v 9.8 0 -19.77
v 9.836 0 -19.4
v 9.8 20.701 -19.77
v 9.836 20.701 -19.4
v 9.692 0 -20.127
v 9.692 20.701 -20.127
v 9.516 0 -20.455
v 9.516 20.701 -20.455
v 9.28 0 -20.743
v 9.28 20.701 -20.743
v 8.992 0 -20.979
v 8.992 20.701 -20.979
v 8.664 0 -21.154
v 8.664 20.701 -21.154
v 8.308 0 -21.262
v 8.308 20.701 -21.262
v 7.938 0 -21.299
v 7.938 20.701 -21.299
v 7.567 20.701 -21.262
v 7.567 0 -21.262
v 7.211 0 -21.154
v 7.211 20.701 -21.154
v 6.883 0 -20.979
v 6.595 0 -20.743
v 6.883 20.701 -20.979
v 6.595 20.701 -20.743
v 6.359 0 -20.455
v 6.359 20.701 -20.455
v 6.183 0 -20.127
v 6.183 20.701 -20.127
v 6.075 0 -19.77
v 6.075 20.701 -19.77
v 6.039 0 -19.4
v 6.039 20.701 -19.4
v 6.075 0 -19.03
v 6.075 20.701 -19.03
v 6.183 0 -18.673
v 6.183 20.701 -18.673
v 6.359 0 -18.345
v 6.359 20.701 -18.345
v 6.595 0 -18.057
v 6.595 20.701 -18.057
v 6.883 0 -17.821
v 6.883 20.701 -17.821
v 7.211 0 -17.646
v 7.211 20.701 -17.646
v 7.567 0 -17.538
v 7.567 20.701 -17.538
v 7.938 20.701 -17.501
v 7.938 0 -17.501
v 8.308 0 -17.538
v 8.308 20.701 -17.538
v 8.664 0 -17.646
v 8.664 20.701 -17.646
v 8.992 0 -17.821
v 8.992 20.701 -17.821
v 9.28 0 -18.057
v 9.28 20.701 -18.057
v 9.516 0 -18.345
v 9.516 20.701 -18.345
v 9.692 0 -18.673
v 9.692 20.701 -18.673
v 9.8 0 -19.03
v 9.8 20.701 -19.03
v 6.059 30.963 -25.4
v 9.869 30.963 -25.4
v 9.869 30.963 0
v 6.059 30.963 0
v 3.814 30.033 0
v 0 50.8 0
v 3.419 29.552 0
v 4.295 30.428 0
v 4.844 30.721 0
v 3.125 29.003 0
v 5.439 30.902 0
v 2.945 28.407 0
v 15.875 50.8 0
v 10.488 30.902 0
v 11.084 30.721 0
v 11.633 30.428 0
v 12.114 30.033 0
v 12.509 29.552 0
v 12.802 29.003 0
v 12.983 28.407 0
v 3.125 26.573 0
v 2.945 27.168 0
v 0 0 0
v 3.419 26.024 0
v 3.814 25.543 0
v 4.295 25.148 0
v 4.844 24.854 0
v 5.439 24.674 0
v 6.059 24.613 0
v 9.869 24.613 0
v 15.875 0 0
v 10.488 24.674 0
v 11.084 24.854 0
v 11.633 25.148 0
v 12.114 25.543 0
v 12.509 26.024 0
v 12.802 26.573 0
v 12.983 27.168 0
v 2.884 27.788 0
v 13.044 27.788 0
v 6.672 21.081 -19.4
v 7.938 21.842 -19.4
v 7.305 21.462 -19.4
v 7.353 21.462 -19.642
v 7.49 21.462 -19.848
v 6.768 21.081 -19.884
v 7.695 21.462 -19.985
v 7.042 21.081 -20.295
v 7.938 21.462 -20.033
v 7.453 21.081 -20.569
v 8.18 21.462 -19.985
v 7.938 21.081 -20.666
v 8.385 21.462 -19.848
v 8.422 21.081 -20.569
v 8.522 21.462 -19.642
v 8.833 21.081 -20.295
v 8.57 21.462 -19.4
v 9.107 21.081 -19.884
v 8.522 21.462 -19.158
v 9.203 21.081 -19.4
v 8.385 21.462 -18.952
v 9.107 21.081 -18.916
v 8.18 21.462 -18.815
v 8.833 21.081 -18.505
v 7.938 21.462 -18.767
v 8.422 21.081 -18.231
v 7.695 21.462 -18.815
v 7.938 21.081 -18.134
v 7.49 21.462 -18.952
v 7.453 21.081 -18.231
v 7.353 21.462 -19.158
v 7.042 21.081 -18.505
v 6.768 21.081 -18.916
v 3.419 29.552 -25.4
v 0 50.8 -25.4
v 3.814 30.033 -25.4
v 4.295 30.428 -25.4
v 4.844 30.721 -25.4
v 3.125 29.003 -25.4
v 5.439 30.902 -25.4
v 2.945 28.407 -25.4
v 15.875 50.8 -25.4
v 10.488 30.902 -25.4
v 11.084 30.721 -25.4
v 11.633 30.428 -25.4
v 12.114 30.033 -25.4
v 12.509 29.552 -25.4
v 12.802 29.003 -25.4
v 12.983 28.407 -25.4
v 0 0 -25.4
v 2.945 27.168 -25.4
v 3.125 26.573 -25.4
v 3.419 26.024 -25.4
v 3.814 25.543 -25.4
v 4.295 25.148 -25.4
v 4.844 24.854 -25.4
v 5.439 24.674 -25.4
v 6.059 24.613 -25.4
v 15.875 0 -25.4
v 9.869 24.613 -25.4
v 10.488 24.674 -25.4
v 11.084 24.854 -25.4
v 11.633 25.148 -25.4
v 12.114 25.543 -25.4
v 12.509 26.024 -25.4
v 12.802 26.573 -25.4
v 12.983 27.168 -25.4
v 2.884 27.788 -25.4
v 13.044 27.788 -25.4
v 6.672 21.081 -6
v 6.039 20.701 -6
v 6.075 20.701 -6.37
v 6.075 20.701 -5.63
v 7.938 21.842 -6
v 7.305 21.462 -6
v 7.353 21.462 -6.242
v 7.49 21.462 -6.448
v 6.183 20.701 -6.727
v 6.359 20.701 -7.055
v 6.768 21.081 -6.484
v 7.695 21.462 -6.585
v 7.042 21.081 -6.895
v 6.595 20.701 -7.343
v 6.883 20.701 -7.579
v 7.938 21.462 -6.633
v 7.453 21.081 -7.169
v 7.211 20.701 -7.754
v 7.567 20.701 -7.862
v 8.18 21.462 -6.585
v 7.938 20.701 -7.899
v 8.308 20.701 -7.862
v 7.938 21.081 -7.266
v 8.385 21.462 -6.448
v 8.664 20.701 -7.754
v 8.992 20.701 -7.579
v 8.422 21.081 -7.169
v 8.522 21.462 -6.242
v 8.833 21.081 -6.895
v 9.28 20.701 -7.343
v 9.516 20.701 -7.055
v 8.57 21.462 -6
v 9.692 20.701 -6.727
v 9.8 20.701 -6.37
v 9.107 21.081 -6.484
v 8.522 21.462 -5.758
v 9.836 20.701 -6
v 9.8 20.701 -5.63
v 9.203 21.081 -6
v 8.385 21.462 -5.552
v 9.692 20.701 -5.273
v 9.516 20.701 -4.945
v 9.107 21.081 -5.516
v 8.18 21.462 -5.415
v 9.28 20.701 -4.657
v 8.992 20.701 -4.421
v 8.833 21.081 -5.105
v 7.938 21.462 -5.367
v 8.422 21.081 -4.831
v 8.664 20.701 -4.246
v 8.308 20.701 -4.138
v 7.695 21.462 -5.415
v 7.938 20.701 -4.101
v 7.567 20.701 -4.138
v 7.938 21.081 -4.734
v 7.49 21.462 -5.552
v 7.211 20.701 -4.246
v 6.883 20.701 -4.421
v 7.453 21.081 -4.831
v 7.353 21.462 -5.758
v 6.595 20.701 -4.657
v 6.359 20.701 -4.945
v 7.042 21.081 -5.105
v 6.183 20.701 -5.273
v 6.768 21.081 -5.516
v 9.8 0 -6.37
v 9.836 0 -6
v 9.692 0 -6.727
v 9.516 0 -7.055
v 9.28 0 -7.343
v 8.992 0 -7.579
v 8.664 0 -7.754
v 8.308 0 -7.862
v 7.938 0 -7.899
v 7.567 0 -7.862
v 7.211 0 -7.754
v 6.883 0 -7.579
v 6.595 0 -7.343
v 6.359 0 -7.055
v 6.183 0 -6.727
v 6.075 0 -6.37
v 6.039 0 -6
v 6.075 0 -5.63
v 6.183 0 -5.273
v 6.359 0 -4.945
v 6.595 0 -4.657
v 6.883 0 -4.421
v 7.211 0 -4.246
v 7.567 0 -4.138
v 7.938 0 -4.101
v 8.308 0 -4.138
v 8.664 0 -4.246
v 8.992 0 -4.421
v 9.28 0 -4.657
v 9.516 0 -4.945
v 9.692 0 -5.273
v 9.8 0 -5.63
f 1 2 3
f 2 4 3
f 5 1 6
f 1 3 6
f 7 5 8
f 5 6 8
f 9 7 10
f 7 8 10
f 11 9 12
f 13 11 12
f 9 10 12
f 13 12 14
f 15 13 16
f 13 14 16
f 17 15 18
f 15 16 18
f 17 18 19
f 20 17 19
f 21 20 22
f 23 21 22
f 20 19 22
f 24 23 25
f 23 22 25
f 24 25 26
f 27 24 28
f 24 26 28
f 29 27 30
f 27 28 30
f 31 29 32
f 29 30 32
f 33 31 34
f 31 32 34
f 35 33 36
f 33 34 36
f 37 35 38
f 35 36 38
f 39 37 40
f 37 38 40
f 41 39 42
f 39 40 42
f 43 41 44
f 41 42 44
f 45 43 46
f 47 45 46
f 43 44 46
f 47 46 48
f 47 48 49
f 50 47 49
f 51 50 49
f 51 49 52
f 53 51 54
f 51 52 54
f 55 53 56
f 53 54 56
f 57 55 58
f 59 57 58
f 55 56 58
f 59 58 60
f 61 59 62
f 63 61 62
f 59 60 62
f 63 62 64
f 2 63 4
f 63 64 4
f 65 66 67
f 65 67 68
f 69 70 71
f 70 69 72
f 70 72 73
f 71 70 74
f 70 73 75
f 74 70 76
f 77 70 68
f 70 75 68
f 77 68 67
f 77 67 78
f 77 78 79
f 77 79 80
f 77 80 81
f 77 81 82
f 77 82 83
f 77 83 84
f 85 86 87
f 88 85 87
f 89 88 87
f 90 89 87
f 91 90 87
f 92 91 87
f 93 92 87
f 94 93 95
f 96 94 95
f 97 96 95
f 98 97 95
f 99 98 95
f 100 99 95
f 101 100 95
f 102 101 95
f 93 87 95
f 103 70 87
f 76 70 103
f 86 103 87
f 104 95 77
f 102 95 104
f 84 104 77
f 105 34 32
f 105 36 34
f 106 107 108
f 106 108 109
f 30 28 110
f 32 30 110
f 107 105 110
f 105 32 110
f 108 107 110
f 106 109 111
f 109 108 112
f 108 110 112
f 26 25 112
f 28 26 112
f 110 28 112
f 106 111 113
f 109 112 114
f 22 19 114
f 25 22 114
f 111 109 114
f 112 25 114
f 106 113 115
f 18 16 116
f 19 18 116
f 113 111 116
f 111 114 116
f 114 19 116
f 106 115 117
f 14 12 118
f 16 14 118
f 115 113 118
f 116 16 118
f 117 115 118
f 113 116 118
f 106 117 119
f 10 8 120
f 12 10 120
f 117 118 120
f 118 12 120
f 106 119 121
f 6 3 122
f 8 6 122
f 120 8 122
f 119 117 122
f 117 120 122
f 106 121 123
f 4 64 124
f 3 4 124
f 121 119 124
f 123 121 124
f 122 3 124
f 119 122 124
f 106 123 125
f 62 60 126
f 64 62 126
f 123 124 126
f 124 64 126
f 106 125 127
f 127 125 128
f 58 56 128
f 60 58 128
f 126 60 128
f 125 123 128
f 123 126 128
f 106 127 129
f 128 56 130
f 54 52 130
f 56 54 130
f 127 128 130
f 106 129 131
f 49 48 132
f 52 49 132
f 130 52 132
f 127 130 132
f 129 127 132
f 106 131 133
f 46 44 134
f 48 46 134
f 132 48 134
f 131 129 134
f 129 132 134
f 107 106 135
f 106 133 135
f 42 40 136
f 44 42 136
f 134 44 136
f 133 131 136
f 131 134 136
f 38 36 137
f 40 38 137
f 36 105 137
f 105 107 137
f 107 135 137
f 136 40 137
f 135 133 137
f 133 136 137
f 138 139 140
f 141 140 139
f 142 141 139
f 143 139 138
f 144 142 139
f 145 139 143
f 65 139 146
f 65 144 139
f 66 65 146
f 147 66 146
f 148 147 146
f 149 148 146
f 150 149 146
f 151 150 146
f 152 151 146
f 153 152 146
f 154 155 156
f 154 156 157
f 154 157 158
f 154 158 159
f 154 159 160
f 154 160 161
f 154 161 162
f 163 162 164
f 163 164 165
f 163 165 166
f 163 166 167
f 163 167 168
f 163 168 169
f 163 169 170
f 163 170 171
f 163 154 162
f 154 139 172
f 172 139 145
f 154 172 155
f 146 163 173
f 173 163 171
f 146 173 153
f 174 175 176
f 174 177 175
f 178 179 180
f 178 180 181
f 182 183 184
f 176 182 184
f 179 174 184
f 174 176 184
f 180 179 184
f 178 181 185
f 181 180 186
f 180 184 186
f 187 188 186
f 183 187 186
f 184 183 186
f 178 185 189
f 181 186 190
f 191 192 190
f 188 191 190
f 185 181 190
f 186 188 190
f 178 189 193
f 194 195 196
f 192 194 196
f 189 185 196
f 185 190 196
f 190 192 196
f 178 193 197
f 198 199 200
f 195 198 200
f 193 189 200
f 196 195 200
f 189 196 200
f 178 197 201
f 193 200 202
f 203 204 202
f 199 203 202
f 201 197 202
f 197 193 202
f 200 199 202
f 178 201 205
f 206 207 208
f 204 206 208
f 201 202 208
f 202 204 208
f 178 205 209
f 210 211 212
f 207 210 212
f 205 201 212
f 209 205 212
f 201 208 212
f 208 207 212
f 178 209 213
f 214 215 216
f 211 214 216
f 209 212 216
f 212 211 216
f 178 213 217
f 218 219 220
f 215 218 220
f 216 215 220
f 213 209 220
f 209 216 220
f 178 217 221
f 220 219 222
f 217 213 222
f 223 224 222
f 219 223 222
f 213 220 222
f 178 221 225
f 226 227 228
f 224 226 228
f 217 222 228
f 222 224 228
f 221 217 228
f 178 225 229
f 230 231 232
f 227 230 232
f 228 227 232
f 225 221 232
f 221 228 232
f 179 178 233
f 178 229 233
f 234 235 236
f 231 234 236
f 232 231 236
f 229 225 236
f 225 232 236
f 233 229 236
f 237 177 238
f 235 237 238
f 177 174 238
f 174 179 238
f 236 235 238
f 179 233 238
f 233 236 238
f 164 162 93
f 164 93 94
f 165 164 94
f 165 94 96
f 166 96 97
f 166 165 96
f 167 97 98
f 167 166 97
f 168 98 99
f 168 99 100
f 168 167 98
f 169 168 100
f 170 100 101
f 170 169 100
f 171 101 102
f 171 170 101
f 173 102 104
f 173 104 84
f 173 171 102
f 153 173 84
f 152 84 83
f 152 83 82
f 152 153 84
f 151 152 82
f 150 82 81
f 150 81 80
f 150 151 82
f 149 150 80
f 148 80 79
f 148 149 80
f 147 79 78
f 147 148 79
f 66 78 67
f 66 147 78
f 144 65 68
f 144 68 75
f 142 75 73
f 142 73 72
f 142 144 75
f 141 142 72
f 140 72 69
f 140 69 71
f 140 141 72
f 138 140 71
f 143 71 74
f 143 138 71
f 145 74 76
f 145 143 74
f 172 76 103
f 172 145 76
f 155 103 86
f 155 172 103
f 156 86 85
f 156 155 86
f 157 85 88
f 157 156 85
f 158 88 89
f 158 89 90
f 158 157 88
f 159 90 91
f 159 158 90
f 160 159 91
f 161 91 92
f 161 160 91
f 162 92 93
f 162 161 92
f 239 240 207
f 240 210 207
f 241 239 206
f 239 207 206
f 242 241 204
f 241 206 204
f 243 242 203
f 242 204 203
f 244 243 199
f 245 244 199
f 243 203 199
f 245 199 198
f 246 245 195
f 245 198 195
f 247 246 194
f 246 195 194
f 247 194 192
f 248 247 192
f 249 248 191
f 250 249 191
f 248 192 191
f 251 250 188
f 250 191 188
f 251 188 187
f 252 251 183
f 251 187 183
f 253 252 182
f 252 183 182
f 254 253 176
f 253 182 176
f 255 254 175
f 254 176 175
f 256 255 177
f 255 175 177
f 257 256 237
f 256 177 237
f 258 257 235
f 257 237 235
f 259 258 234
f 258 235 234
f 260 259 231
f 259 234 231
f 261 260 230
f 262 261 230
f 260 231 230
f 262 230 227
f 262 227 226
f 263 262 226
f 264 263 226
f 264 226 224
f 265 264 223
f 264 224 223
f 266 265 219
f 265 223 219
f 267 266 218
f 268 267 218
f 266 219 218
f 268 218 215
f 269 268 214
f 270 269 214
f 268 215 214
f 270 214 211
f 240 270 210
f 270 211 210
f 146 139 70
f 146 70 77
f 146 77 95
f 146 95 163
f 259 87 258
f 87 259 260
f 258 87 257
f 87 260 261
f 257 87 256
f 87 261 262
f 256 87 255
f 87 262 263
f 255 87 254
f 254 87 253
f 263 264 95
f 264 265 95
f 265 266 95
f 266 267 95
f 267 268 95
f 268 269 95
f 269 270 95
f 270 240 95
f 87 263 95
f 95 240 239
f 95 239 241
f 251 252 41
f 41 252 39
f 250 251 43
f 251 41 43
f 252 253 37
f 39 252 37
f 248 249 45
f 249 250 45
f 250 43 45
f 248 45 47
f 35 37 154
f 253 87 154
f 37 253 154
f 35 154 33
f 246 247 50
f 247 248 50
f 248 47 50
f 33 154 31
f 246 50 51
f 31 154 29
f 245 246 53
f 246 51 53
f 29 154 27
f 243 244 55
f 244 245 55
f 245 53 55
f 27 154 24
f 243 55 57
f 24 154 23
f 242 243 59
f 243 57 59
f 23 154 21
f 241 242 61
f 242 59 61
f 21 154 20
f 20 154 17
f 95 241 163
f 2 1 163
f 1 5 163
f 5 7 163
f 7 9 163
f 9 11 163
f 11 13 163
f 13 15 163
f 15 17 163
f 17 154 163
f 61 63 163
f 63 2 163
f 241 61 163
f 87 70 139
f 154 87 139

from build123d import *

# Parameters (mm, degrees)
SKETCH1_W                           = 15.875
SKETCH1_H                           = 25.4
BOSS_EXTRUDE1_DEPTH                 = 50.8
TAP_DRILL_FOR_10_24_TAP1_D          = 3.7973
TAP_DRILL_FOR_10_24_TAP1_DEPTH      = 20.701
TAP_DRILL_FOR_10_24_TAP1_TIP        = 1.140824014
TAP_START                           = -25.4
TAP_DRILL_SLOT_FOR_10_24_TAP1_DEPTH = 25.4


# Read off the part's stored shape, not the designer's step: Tap Drill Slot for #10-24 Tap1
with BuildPart() as part:
    # Sketch1 → Boss-Extrude1 (new body)
    with BuildSketch(Plane(origin=(0, 0, 0), x_dir=(1, 0, 0), z_dir=(0, 1, 0))):
        with Locations((7.9375, 12.7)):
            Rectangle(SKETCH1_W, SKETCH1_H)
    extrude(amount=BOSS_EXTRUDE1_DEPTH)

    # Tap Drill for #10-24 Tap1
    with Locations(Plane(origin=(0, 0, 0), x_dir=(-1, 0, 0), z_dir=(0, -1, 0))):
        with Locations((-7.9375, 6), (-7.9375, 19.4)):
            Hole(TAP_DRILL_FOR_10_24_TAP1_D / 2, depth=TAP_DRILL_FOR_10_24_TAP1_DEPTH)
            with Locations((0, 0, -(TAP_DRILL_FOR_10_24_TAP1_DEPTH + TAP_DRILL_FOR_10_24_TAP1_TIP / 2))):  # 118° drill point
                Cone(0, TAP_DRILL_FOR_10_24_TAP1_D / 2, TAP_DRILL_FOR_10_24_TAP1_TIP, mode=Mode.SUBTRACT)

    # Tap Drill Slot for #10-24 Tap1 outline → Tap Drill Slot for #10-24 Tap1 (cut)
    with BuildSketch(Plane.XY.offset(TAP_START)):
        with BuildLine():
            Line((6.058801855, 24.6126), (9.868801855, 24.6126))
            ThreePointArc((9.868801855, 24.6126), (13.043801855, 27.7876), (9.868801855, 30.9626))
            Line((9.868801855, 30.9626), (6.058801855, 30.9626))
            ThreePointArc((6.058801855, 30.9626), (2.883801855, 27.7876), (6.058801855, 24.6126))
        make_face()
    extrude(amount=TAP_DRILL_SLOT_FOR_10_24_TAP1_DEPTH, mode=Mode.SUBTRACT)


solid = part.part
